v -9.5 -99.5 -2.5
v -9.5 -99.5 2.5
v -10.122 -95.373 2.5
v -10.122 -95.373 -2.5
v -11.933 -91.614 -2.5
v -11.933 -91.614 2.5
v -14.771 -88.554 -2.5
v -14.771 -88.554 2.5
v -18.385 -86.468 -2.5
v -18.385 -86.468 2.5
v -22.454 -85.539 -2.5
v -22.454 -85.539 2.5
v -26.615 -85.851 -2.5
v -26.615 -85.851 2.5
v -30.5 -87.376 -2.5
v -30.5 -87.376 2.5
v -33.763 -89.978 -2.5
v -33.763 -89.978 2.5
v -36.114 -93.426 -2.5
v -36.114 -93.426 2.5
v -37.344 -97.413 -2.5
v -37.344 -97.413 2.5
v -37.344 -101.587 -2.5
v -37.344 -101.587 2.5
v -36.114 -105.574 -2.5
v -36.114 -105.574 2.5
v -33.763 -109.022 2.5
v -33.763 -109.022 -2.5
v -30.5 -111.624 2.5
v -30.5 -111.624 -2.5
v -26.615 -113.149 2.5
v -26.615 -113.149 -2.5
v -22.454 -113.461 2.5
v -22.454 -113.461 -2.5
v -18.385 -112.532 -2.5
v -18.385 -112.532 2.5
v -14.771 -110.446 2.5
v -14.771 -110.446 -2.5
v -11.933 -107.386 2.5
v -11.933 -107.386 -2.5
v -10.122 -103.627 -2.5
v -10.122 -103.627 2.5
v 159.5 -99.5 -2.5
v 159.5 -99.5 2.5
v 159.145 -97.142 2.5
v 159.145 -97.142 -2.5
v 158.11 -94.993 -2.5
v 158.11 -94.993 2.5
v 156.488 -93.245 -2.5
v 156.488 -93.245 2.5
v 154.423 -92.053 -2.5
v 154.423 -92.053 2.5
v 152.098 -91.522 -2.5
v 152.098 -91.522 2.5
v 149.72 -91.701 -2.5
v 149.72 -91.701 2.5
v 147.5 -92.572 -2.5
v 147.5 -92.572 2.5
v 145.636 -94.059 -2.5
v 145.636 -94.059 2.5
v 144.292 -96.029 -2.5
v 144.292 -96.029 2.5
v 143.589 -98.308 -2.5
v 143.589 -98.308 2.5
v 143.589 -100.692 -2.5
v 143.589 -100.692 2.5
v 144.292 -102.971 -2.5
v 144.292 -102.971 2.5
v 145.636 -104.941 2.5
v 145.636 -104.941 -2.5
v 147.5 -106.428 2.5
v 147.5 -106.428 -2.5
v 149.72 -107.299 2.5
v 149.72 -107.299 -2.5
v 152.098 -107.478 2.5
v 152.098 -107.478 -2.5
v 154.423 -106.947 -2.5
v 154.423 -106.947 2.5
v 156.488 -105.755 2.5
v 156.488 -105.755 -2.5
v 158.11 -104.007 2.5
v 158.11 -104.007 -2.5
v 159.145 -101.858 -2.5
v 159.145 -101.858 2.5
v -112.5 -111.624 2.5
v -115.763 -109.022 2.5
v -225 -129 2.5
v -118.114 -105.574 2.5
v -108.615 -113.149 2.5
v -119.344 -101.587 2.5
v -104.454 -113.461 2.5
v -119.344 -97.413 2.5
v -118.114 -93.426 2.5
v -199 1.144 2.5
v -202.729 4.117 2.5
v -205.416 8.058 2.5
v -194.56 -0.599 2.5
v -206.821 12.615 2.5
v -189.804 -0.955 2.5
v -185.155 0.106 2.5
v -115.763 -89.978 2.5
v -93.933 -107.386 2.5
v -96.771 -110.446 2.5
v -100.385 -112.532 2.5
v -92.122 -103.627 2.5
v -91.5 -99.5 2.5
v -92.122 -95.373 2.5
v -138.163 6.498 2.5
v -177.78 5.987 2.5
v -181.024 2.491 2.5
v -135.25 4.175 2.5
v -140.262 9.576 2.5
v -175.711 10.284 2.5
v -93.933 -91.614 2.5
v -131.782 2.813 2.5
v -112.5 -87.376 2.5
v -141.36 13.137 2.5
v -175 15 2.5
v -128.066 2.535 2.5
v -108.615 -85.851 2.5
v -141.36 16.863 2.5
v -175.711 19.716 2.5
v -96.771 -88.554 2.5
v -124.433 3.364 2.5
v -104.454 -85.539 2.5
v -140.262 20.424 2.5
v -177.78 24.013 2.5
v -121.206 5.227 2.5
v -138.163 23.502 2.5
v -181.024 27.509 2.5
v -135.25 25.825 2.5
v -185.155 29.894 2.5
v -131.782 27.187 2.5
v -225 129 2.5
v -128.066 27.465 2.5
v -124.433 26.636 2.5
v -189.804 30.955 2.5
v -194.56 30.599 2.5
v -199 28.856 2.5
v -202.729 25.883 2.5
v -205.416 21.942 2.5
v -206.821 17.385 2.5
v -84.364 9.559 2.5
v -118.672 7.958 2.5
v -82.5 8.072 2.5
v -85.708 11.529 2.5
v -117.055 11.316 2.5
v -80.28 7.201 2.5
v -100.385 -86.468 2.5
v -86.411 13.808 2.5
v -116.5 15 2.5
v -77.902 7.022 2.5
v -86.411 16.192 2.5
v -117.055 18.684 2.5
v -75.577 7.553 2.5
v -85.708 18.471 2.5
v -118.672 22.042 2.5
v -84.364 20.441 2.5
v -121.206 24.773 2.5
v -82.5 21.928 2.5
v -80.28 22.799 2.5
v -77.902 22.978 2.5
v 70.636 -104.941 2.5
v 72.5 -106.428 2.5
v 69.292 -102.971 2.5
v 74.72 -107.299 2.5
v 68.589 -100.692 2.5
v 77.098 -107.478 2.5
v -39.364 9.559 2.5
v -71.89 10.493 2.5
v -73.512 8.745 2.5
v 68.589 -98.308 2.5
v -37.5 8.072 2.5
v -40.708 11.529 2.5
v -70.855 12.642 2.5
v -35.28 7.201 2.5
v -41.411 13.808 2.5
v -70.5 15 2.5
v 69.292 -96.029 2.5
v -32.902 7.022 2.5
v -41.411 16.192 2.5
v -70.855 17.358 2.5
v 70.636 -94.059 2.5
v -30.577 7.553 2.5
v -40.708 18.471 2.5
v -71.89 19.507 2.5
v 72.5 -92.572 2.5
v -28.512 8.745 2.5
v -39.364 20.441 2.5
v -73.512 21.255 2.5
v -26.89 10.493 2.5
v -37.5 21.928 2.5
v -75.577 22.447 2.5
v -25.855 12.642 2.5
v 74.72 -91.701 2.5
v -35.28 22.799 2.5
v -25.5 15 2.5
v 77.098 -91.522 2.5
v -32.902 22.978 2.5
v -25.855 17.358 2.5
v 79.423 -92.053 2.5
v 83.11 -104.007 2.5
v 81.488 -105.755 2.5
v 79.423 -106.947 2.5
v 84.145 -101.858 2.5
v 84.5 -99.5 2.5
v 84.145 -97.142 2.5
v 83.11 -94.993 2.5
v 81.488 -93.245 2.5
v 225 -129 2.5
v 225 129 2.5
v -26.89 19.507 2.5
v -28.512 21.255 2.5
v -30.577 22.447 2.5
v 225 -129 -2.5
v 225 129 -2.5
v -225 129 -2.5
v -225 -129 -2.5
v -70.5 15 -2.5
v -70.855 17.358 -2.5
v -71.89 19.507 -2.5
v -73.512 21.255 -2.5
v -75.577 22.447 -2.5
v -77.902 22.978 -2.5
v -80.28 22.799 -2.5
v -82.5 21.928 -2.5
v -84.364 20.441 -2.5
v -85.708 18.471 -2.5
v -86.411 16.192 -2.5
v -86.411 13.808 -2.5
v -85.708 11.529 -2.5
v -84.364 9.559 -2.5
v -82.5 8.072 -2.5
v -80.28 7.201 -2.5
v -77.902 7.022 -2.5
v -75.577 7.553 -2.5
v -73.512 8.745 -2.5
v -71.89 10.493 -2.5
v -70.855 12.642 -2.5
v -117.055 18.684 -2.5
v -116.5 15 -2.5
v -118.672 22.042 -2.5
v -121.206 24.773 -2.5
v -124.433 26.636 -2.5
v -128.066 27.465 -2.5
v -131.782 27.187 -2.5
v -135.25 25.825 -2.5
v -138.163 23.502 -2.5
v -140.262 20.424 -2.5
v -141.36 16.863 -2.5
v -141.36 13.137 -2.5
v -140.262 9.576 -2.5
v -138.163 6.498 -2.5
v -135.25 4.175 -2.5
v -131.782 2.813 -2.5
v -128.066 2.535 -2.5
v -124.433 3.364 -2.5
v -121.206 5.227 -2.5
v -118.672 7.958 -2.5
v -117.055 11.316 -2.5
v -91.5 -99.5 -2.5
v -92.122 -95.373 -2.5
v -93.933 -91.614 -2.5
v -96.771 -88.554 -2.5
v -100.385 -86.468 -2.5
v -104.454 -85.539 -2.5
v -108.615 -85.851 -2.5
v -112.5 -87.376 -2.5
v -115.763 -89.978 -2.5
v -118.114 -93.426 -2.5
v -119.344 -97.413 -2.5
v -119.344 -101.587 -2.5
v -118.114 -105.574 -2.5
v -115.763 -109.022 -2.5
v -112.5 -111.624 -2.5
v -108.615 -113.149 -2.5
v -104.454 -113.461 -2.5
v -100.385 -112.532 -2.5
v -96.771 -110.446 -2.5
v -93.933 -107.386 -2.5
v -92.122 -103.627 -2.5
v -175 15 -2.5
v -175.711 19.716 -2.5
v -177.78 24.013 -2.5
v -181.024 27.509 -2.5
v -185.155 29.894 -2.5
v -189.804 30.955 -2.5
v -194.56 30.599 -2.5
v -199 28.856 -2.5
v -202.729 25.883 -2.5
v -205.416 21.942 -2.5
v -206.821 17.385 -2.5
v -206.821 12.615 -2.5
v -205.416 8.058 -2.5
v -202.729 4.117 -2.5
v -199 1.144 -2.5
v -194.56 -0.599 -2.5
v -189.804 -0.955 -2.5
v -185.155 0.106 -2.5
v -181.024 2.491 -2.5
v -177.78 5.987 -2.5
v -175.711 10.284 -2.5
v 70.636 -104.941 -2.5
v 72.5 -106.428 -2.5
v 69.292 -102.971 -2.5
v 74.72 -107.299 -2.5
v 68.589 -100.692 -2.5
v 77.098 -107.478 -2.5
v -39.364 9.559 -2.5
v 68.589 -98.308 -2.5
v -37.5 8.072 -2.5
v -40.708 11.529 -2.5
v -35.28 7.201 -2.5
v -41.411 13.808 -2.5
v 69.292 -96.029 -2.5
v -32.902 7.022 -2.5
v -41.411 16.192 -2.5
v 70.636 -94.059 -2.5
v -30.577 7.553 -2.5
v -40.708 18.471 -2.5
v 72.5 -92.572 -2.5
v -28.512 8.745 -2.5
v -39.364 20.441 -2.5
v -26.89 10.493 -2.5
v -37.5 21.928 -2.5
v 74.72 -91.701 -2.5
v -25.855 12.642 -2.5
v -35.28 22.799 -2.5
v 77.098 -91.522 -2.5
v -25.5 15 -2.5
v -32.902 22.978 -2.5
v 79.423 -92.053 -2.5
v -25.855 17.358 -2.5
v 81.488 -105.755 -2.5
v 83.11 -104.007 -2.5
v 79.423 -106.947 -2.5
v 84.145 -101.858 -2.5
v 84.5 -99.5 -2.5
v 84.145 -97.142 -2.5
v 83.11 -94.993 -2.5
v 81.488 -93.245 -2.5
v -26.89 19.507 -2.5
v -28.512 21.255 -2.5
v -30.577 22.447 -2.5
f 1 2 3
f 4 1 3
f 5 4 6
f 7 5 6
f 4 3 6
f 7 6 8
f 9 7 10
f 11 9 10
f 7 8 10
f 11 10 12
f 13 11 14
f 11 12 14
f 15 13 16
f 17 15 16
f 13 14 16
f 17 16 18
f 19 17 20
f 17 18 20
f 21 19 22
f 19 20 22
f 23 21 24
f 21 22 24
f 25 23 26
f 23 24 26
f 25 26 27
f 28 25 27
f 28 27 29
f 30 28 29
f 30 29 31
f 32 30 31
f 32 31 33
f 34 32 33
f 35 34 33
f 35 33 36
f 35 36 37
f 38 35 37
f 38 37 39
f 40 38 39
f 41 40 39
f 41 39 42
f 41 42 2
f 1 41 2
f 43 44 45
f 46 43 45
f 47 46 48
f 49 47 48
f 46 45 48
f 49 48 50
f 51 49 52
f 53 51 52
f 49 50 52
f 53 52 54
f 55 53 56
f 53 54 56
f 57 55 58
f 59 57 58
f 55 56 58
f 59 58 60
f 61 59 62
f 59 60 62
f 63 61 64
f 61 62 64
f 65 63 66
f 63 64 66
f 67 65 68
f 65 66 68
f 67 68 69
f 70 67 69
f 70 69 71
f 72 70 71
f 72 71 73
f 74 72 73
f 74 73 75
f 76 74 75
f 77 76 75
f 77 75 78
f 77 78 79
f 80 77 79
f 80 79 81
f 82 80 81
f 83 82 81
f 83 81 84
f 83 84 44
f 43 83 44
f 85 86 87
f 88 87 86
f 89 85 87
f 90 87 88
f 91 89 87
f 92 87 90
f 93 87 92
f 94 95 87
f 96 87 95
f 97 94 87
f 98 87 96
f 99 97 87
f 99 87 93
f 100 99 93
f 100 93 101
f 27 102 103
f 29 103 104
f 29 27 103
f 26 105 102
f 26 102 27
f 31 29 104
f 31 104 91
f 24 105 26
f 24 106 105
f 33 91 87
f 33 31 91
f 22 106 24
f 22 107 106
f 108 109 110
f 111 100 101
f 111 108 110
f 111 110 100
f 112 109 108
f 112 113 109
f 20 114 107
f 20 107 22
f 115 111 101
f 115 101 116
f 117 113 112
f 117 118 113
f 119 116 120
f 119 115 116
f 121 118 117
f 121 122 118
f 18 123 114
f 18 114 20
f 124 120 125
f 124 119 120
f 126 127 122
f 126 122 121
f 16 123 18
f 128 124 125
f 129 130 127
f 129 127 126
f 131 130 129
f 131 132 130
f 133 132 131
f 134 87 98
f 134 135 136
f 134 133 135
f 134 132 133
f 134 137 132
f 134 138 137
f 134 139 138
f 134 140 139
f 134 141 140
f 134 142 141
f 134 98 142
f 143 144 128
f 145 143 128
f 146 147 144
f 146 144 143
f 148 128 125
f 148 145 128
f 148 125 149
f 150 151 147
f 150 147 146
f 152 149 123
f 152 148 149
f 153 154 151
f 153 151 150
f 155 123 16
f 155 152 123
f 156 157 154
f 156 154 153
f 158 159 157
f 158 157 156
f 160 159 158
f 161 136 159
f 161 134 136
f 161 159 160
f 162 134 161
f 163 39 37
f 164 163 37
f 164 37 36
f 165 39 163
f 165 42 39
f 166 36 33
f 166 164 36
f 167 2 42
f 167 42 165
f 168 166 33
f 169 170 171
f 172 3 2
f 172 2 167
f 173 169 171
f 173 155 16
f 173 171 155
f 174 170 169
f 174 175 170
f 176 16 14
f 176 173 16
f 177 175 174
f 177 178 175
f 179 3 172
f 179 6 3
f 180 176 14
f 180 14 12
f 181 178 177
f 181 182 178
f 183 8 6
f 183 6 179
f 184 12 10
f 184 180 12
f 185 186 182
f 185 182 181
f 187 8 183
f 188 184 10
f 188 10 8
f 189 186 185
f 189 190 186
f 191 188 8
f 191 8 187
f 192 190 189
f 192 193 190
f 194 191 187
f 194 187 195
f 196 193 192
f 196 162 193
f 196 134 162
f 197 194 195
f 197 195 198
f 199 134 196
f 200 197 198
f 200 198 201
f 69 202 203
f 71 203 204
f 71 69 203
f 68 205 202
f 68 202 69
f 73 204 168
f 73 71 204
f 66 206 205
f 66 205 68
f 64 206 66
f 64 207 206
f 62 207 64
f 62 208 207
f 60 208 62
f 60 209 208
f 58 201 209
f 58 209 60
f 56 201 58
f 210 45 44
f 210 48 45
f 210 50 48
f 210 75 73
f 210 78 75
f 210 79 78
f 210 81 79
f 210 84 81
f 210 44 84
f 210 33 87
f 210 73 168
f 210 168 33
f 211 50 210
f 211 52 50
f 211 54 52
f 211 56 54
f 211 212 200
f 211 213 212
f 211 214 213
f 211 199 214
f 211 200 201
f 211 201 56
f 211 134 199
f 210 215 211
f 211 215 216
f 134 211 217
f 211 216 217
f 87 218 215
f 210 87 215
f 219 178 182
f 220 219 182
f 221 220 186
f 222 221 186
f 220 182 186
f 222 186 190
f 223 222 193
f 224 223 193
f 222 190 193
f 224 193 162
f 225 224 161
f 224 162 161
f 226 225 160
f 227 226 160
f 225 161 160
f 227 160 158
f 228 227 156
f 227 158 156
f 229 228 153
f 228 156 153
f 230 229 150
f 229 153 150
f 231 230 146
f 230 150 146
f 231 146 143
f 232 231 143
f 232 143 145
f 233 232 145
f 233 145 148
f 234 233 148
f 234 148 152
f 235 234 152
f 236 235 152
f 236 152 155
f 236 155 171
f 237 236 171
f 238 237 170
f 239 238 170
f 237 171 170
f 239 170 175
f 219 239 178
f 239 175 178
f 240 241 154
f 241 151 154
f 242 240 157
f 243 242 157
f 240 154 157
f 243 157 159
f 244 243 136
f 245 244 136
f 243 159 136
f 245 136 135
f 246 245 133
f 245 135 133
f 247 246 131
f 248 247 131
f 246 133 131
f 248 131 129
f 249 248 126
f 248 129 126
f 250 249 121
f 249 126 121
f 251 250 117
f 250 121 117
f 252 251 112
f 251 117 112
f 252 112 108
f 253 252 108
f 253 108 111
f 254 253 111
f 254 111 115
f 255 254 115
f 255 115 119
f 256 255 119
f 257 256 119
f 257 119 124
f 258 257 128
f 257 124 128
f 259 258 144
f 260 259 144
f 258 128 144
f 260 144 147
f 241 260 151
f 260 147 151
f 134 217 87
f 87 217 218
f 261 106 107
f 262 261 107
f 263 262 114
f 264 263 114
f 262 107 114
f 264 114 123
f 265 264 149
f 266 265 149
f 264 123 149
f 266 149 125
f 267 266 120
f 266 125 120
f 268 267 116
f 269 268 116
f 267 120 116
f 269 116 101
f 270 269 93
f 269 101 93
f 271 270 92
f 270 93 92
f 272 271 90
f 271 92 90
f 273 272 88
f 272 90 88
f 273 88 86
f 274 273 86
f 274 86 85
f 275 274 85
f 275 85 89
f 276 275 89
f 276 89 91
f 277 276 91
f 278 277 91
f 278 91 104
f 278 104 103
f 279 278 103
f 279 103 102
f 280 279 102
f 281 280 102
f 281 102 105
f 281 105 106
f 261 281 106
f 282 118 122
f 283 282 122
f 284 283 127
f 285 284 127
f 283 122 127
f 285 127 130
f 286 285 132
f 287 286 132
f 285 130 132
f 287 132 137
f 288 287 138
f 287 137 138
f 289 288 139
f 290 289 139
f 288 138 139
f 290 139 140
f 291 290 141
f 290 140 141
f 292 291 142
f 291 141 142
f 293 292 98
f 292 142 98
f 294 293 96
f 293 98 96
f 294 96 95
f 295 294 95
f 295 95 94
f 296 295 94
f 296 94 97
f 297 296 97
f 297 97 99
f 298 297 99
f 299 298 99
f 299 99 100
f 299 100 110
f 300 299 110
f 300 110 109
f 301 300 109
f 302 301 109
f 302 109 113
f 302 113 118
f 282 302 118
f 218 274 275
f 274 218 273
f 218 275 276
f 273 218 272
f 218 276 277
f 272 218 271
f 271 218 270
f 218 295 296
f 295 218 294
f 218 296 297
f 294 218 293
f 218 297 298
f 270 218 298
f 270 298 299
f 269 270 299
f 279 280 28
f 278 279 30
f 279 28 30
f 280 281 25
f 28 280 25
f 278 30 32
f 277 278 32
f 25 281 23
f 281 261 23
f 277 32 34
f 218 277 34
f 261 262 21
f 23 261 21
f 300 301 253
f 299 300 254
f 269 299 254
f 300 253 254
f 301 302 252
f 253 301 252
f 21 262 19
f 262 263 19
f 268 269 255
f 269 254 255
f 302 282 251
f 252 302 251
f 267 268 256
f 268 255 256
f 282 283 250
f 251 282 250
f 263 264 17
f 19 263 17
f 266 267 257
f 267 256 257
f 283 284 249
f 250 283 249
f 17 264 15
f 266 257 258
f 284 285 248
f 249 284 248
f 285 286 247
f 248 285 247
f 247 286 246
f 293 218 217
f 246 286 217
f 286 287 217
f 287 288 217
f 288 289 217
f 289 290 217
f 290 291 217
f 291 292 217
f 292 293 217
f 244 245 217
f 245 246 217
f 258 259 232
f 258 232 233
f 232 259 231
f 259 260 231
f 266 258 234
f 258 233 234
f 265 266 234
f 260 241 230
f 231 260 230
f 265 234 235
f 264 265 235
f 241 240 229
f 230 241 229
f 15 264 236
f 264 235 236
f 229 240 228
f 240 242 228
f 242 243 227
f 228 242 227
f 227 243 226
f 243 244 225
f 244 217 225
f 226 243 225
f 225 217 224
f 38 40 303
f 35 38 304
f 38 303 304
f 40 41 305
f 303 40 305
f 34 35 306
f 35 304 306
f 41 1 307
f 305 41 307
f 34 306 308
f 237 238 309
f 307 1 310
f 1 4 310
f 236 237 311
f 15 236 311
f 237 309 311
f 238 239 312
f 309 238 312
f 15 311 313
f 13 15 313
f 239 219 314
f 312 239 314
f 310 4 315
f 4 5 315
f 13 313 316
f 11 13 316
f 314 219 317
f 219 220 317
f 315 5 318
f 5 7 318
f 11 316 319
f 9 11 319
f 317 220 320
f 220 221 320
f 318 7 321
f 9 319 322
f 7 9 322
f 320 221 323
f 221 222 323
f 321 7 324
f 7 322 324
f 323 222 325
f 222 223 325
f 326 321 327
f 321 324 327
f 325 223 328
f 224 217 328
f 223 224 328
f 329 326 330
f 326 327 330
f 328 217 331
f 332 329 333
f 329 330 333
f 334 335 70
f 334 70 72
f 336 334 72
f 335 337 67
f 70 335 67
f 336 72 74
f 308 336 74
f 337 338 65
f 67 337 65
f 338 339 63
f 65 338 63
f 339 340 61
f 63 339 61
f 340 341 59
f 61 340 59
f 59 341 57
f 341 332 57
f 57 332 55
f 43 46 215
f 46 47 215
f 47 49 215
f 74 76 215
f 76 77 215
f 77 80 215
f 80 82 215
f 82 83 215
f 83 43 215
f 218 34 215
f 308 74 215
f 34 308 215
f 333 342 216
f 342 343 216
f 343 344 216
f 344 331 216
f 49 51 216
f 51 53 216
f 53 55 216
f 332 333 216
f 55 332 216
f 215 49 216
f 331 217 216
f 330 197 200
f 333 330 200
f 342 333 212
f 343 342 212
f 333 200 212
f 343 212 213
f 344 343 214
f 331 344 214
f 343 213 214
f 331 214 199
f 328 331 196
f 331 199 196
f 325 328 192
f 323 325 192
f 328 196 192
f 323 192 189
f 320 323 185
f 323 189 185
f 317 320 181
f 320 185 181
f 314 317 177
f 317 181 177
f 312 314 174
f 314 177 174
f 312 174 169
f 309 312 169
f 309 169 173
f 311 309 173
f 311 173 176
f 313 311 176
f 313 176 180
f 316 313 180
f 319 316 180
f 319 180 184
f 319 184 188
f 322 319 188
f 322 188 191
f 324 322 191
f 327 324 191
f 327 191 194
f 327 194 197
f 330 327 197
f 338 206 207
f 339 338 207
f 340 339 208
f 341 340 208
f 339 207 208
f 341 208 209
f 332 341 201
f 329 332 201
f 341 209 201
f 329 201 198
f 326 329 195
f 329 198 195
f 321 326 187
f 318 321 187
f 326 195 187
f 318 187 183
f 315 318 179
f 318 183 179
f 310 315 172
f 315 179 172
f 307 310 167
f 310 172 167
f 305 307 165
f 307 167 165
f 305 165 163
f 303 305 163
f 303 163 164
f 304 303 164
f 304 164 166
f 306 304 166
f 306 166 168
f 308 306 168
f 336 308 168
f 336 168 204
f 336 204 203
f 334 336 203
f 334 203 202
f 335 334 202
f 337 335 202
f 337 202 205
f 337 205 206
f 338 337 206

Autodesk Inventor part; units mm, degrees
ref_plane "YZ Plane" through (0, 0, 0) normal (1, 0, 0) x (0, 1, 0)
ref_plane "XZ Plane" through (0, 0, 0) normal (0, 1, 0) x (-1, 0, 0)
ref_plane "XY Plane" through (0, 0, 0) normal (0, 0, 1) x (1, 0, 0)
sketch "Sketch1" plane through (0, 0, 0) normal (0, 0, 1) x (1, 0, 0)
  line L0 (-225, -129) -> (225, -129)
  line L1 (225, -129) -> (225, 129)
  line L2 (225, 129) -> (-225, 129)
  line L3 (-225, 129) -> (-225, -129)
  line L4 (-225, -129) -> (225, 129) construction
  line L5 (225, -129) -> (-225, 129) construction
  point P0 (0, 0)
  dimension "d0" = 450
  dimension "d1" = 258
extrude "Extrusion1" add sketch "Sketch1" along normal mid plane 5
sketch "Sketch2" plane through (0, 0, 2.5) normal (0, 0, 1) x (1, 0, 0)
  circle A0 centre (-105.5, -99.5) radius 19.5 construction
  line L0 (-225, -129) -> (225, -129) construction
  line L1 (-225, 129) -> (-225, -129) construction
  circle A1 centre (-23.5, -99.5) radius 19.5 construction
  circle A2 centre (76.5, -99.5) radius 12.5 construction
  circle A3 centre (151.5, -99.5) radius 12.5 construction
  circle A4 centre (-191, 15) radius 24 construction
  circle A5 centre (-129, 15) radius 18 construction
  circle A6 centre (-78.5, 15) radius 12.5 construction
  circle A7 centre (-33.5, 15) radius 12.5 construction
  circle A8 centre (-191, 15) radius 16
  circle A9 centre (-129, 15) radius 12.5
  circle A10 centre (-78.5, 15) radius 8
  circle A11 centre (-33.5, 15) radius 8
  circle A12 centre (-105.5, -99.5) radius 14
  circle A13 centre (-23.5, -99.5) radius 14
  circle A14 centre (76.5, -99.5) radius 8
  circle A15 centre (151.5, -99.5) radius 8
  point P0 (0, 0)
  dimension "d4" = 39
  dimension "d5" = 29.5
  dimension "d6" = 119.5
  dimension "d7" = 39
  dimension "d8" = 25
  dimension "d9" = 25
  dimension "d10" = 48
  dimension "d11" = 36
  dimension "d12" = 25
  dimension "d13" = 25
  dimension "d14" = 29.5
  dimension "d15" = 29.5
  dimension "d16" = 29.5
  dimension "d17" = 144
  dimension "d18" = 144
  dimension "d19" = 144
  dimension "d20" = 144
  dimension "d21" = 82
  dimension "d22" = 100
  dimension "d23" = 75
  dimension "d24" = 34
  dimension "d25" = 62
  dimension "d26" = 50.5
  dimension "d27" = 45
  dimension "d28" = 32
  dimension "d29" = 25
  dimension "d30" = 16
  dimension "d31" = 16
  dimension "d32" = 28
  dimension "d33" = 28
  dimension "d34" = 16
  dimension "d35" = 16
extrude "Extrusion2" cut sketch "Sketch2" against normal blind 5
equation "\"d0\" = boxw"
equation "\"d1\" = boxh"
equation "\"d2\" = pvct"
equation "\"d4\" = waterouter"
equation "\"d6\" = 0.5 * waterouter + distsidewater"
equation "\"d7\" = airoutouter"
equation "\"d8\" = pumpouter"
equation "\"d9\" = pumpouter"
equation "\"d10\" = diaphouter"
equation "\"d11\" = diaetapeouter"
equation "\"d12\" = dialoadouter"
equation "\"d13\" = dialoadouter"
equation "\"d21\" = distbubblewater"
equation "\"d22\" = distpumpbubble"
equation "\"d23\" = distpumps"
equation "\"d28\" = diaph"
equation "\"d29\" = diaetape"
equation "\"d30\" = pumpinner"
equation "\"d31\" = pumpinner"
equation "\"d32\" = waterinner"
equation "\"d33\" = airoutinner"
equation "\"d34\" = pumpinner"
equation "\"d35\" = pumpinner"
equation "\"d36\" = pvct"
equation "\"solhole\" = 3"
equation "\"solholespacing\" = 16"
equation "\"ssolw\" = 63"
equation "\"bsoll\" = 126"
equation "\"bsolw\" = 91"
equation "\"bsolh\" = 126"
equation "\"tapl\" = 31"
equation "\"tl\" = 32"
equation "\"eloboww\" = 25"
equation "\"pvct\" = 5"
equation "\"boxw\" = 450"
equation "\"boxh\" = 258"
equation "\"supporth\" = 15"
equation "\"play\" = 0.5"
equation "\"pcbw\" = 76"
equation "\"arw\" = 54"
equation "\"pcbl\" = 86"
equation "\"arl\" = 102"
equation "\"psuh\" = 85"
equation "\"pcbh\" = 46"
equation "\"screenl\" = 115"
equation "\"screenw\" = 197"
equation "\"seph\" = 105"
equation "\"diapowerouter\" = 25"
equation "\"dialoadouter\" = 25"
equation "\"diaetapeouter\" = 36"
equation "\"diaphouter\" = 48"
equation "\"diaload\" = 16"
equation "\"diaetape\" = 25"
equation "\"diaph\" = 32"
equation "\"distbubblewater\" = 82"
equation "\"diapower\" = 16"
equation "\"distpumpbubble\" = 100"
equation "\"waterinner\" = 28"
equation "\"distpumps\" = 75"
equation "\"airoutouter\" = 39"
equation "\"airoutinner\" = 28"
equation "\"pumpouter\" = 25"
equation "\"waterouter\" = 39"
equation "\"pumpinner\" = 16"
equation "\"airinouter\" = 39"
equation "\"airininner\" = 28"
equation "\"distsidewater\" = 100"
properties part number "sb_front_back" material "PVC-Piping"
